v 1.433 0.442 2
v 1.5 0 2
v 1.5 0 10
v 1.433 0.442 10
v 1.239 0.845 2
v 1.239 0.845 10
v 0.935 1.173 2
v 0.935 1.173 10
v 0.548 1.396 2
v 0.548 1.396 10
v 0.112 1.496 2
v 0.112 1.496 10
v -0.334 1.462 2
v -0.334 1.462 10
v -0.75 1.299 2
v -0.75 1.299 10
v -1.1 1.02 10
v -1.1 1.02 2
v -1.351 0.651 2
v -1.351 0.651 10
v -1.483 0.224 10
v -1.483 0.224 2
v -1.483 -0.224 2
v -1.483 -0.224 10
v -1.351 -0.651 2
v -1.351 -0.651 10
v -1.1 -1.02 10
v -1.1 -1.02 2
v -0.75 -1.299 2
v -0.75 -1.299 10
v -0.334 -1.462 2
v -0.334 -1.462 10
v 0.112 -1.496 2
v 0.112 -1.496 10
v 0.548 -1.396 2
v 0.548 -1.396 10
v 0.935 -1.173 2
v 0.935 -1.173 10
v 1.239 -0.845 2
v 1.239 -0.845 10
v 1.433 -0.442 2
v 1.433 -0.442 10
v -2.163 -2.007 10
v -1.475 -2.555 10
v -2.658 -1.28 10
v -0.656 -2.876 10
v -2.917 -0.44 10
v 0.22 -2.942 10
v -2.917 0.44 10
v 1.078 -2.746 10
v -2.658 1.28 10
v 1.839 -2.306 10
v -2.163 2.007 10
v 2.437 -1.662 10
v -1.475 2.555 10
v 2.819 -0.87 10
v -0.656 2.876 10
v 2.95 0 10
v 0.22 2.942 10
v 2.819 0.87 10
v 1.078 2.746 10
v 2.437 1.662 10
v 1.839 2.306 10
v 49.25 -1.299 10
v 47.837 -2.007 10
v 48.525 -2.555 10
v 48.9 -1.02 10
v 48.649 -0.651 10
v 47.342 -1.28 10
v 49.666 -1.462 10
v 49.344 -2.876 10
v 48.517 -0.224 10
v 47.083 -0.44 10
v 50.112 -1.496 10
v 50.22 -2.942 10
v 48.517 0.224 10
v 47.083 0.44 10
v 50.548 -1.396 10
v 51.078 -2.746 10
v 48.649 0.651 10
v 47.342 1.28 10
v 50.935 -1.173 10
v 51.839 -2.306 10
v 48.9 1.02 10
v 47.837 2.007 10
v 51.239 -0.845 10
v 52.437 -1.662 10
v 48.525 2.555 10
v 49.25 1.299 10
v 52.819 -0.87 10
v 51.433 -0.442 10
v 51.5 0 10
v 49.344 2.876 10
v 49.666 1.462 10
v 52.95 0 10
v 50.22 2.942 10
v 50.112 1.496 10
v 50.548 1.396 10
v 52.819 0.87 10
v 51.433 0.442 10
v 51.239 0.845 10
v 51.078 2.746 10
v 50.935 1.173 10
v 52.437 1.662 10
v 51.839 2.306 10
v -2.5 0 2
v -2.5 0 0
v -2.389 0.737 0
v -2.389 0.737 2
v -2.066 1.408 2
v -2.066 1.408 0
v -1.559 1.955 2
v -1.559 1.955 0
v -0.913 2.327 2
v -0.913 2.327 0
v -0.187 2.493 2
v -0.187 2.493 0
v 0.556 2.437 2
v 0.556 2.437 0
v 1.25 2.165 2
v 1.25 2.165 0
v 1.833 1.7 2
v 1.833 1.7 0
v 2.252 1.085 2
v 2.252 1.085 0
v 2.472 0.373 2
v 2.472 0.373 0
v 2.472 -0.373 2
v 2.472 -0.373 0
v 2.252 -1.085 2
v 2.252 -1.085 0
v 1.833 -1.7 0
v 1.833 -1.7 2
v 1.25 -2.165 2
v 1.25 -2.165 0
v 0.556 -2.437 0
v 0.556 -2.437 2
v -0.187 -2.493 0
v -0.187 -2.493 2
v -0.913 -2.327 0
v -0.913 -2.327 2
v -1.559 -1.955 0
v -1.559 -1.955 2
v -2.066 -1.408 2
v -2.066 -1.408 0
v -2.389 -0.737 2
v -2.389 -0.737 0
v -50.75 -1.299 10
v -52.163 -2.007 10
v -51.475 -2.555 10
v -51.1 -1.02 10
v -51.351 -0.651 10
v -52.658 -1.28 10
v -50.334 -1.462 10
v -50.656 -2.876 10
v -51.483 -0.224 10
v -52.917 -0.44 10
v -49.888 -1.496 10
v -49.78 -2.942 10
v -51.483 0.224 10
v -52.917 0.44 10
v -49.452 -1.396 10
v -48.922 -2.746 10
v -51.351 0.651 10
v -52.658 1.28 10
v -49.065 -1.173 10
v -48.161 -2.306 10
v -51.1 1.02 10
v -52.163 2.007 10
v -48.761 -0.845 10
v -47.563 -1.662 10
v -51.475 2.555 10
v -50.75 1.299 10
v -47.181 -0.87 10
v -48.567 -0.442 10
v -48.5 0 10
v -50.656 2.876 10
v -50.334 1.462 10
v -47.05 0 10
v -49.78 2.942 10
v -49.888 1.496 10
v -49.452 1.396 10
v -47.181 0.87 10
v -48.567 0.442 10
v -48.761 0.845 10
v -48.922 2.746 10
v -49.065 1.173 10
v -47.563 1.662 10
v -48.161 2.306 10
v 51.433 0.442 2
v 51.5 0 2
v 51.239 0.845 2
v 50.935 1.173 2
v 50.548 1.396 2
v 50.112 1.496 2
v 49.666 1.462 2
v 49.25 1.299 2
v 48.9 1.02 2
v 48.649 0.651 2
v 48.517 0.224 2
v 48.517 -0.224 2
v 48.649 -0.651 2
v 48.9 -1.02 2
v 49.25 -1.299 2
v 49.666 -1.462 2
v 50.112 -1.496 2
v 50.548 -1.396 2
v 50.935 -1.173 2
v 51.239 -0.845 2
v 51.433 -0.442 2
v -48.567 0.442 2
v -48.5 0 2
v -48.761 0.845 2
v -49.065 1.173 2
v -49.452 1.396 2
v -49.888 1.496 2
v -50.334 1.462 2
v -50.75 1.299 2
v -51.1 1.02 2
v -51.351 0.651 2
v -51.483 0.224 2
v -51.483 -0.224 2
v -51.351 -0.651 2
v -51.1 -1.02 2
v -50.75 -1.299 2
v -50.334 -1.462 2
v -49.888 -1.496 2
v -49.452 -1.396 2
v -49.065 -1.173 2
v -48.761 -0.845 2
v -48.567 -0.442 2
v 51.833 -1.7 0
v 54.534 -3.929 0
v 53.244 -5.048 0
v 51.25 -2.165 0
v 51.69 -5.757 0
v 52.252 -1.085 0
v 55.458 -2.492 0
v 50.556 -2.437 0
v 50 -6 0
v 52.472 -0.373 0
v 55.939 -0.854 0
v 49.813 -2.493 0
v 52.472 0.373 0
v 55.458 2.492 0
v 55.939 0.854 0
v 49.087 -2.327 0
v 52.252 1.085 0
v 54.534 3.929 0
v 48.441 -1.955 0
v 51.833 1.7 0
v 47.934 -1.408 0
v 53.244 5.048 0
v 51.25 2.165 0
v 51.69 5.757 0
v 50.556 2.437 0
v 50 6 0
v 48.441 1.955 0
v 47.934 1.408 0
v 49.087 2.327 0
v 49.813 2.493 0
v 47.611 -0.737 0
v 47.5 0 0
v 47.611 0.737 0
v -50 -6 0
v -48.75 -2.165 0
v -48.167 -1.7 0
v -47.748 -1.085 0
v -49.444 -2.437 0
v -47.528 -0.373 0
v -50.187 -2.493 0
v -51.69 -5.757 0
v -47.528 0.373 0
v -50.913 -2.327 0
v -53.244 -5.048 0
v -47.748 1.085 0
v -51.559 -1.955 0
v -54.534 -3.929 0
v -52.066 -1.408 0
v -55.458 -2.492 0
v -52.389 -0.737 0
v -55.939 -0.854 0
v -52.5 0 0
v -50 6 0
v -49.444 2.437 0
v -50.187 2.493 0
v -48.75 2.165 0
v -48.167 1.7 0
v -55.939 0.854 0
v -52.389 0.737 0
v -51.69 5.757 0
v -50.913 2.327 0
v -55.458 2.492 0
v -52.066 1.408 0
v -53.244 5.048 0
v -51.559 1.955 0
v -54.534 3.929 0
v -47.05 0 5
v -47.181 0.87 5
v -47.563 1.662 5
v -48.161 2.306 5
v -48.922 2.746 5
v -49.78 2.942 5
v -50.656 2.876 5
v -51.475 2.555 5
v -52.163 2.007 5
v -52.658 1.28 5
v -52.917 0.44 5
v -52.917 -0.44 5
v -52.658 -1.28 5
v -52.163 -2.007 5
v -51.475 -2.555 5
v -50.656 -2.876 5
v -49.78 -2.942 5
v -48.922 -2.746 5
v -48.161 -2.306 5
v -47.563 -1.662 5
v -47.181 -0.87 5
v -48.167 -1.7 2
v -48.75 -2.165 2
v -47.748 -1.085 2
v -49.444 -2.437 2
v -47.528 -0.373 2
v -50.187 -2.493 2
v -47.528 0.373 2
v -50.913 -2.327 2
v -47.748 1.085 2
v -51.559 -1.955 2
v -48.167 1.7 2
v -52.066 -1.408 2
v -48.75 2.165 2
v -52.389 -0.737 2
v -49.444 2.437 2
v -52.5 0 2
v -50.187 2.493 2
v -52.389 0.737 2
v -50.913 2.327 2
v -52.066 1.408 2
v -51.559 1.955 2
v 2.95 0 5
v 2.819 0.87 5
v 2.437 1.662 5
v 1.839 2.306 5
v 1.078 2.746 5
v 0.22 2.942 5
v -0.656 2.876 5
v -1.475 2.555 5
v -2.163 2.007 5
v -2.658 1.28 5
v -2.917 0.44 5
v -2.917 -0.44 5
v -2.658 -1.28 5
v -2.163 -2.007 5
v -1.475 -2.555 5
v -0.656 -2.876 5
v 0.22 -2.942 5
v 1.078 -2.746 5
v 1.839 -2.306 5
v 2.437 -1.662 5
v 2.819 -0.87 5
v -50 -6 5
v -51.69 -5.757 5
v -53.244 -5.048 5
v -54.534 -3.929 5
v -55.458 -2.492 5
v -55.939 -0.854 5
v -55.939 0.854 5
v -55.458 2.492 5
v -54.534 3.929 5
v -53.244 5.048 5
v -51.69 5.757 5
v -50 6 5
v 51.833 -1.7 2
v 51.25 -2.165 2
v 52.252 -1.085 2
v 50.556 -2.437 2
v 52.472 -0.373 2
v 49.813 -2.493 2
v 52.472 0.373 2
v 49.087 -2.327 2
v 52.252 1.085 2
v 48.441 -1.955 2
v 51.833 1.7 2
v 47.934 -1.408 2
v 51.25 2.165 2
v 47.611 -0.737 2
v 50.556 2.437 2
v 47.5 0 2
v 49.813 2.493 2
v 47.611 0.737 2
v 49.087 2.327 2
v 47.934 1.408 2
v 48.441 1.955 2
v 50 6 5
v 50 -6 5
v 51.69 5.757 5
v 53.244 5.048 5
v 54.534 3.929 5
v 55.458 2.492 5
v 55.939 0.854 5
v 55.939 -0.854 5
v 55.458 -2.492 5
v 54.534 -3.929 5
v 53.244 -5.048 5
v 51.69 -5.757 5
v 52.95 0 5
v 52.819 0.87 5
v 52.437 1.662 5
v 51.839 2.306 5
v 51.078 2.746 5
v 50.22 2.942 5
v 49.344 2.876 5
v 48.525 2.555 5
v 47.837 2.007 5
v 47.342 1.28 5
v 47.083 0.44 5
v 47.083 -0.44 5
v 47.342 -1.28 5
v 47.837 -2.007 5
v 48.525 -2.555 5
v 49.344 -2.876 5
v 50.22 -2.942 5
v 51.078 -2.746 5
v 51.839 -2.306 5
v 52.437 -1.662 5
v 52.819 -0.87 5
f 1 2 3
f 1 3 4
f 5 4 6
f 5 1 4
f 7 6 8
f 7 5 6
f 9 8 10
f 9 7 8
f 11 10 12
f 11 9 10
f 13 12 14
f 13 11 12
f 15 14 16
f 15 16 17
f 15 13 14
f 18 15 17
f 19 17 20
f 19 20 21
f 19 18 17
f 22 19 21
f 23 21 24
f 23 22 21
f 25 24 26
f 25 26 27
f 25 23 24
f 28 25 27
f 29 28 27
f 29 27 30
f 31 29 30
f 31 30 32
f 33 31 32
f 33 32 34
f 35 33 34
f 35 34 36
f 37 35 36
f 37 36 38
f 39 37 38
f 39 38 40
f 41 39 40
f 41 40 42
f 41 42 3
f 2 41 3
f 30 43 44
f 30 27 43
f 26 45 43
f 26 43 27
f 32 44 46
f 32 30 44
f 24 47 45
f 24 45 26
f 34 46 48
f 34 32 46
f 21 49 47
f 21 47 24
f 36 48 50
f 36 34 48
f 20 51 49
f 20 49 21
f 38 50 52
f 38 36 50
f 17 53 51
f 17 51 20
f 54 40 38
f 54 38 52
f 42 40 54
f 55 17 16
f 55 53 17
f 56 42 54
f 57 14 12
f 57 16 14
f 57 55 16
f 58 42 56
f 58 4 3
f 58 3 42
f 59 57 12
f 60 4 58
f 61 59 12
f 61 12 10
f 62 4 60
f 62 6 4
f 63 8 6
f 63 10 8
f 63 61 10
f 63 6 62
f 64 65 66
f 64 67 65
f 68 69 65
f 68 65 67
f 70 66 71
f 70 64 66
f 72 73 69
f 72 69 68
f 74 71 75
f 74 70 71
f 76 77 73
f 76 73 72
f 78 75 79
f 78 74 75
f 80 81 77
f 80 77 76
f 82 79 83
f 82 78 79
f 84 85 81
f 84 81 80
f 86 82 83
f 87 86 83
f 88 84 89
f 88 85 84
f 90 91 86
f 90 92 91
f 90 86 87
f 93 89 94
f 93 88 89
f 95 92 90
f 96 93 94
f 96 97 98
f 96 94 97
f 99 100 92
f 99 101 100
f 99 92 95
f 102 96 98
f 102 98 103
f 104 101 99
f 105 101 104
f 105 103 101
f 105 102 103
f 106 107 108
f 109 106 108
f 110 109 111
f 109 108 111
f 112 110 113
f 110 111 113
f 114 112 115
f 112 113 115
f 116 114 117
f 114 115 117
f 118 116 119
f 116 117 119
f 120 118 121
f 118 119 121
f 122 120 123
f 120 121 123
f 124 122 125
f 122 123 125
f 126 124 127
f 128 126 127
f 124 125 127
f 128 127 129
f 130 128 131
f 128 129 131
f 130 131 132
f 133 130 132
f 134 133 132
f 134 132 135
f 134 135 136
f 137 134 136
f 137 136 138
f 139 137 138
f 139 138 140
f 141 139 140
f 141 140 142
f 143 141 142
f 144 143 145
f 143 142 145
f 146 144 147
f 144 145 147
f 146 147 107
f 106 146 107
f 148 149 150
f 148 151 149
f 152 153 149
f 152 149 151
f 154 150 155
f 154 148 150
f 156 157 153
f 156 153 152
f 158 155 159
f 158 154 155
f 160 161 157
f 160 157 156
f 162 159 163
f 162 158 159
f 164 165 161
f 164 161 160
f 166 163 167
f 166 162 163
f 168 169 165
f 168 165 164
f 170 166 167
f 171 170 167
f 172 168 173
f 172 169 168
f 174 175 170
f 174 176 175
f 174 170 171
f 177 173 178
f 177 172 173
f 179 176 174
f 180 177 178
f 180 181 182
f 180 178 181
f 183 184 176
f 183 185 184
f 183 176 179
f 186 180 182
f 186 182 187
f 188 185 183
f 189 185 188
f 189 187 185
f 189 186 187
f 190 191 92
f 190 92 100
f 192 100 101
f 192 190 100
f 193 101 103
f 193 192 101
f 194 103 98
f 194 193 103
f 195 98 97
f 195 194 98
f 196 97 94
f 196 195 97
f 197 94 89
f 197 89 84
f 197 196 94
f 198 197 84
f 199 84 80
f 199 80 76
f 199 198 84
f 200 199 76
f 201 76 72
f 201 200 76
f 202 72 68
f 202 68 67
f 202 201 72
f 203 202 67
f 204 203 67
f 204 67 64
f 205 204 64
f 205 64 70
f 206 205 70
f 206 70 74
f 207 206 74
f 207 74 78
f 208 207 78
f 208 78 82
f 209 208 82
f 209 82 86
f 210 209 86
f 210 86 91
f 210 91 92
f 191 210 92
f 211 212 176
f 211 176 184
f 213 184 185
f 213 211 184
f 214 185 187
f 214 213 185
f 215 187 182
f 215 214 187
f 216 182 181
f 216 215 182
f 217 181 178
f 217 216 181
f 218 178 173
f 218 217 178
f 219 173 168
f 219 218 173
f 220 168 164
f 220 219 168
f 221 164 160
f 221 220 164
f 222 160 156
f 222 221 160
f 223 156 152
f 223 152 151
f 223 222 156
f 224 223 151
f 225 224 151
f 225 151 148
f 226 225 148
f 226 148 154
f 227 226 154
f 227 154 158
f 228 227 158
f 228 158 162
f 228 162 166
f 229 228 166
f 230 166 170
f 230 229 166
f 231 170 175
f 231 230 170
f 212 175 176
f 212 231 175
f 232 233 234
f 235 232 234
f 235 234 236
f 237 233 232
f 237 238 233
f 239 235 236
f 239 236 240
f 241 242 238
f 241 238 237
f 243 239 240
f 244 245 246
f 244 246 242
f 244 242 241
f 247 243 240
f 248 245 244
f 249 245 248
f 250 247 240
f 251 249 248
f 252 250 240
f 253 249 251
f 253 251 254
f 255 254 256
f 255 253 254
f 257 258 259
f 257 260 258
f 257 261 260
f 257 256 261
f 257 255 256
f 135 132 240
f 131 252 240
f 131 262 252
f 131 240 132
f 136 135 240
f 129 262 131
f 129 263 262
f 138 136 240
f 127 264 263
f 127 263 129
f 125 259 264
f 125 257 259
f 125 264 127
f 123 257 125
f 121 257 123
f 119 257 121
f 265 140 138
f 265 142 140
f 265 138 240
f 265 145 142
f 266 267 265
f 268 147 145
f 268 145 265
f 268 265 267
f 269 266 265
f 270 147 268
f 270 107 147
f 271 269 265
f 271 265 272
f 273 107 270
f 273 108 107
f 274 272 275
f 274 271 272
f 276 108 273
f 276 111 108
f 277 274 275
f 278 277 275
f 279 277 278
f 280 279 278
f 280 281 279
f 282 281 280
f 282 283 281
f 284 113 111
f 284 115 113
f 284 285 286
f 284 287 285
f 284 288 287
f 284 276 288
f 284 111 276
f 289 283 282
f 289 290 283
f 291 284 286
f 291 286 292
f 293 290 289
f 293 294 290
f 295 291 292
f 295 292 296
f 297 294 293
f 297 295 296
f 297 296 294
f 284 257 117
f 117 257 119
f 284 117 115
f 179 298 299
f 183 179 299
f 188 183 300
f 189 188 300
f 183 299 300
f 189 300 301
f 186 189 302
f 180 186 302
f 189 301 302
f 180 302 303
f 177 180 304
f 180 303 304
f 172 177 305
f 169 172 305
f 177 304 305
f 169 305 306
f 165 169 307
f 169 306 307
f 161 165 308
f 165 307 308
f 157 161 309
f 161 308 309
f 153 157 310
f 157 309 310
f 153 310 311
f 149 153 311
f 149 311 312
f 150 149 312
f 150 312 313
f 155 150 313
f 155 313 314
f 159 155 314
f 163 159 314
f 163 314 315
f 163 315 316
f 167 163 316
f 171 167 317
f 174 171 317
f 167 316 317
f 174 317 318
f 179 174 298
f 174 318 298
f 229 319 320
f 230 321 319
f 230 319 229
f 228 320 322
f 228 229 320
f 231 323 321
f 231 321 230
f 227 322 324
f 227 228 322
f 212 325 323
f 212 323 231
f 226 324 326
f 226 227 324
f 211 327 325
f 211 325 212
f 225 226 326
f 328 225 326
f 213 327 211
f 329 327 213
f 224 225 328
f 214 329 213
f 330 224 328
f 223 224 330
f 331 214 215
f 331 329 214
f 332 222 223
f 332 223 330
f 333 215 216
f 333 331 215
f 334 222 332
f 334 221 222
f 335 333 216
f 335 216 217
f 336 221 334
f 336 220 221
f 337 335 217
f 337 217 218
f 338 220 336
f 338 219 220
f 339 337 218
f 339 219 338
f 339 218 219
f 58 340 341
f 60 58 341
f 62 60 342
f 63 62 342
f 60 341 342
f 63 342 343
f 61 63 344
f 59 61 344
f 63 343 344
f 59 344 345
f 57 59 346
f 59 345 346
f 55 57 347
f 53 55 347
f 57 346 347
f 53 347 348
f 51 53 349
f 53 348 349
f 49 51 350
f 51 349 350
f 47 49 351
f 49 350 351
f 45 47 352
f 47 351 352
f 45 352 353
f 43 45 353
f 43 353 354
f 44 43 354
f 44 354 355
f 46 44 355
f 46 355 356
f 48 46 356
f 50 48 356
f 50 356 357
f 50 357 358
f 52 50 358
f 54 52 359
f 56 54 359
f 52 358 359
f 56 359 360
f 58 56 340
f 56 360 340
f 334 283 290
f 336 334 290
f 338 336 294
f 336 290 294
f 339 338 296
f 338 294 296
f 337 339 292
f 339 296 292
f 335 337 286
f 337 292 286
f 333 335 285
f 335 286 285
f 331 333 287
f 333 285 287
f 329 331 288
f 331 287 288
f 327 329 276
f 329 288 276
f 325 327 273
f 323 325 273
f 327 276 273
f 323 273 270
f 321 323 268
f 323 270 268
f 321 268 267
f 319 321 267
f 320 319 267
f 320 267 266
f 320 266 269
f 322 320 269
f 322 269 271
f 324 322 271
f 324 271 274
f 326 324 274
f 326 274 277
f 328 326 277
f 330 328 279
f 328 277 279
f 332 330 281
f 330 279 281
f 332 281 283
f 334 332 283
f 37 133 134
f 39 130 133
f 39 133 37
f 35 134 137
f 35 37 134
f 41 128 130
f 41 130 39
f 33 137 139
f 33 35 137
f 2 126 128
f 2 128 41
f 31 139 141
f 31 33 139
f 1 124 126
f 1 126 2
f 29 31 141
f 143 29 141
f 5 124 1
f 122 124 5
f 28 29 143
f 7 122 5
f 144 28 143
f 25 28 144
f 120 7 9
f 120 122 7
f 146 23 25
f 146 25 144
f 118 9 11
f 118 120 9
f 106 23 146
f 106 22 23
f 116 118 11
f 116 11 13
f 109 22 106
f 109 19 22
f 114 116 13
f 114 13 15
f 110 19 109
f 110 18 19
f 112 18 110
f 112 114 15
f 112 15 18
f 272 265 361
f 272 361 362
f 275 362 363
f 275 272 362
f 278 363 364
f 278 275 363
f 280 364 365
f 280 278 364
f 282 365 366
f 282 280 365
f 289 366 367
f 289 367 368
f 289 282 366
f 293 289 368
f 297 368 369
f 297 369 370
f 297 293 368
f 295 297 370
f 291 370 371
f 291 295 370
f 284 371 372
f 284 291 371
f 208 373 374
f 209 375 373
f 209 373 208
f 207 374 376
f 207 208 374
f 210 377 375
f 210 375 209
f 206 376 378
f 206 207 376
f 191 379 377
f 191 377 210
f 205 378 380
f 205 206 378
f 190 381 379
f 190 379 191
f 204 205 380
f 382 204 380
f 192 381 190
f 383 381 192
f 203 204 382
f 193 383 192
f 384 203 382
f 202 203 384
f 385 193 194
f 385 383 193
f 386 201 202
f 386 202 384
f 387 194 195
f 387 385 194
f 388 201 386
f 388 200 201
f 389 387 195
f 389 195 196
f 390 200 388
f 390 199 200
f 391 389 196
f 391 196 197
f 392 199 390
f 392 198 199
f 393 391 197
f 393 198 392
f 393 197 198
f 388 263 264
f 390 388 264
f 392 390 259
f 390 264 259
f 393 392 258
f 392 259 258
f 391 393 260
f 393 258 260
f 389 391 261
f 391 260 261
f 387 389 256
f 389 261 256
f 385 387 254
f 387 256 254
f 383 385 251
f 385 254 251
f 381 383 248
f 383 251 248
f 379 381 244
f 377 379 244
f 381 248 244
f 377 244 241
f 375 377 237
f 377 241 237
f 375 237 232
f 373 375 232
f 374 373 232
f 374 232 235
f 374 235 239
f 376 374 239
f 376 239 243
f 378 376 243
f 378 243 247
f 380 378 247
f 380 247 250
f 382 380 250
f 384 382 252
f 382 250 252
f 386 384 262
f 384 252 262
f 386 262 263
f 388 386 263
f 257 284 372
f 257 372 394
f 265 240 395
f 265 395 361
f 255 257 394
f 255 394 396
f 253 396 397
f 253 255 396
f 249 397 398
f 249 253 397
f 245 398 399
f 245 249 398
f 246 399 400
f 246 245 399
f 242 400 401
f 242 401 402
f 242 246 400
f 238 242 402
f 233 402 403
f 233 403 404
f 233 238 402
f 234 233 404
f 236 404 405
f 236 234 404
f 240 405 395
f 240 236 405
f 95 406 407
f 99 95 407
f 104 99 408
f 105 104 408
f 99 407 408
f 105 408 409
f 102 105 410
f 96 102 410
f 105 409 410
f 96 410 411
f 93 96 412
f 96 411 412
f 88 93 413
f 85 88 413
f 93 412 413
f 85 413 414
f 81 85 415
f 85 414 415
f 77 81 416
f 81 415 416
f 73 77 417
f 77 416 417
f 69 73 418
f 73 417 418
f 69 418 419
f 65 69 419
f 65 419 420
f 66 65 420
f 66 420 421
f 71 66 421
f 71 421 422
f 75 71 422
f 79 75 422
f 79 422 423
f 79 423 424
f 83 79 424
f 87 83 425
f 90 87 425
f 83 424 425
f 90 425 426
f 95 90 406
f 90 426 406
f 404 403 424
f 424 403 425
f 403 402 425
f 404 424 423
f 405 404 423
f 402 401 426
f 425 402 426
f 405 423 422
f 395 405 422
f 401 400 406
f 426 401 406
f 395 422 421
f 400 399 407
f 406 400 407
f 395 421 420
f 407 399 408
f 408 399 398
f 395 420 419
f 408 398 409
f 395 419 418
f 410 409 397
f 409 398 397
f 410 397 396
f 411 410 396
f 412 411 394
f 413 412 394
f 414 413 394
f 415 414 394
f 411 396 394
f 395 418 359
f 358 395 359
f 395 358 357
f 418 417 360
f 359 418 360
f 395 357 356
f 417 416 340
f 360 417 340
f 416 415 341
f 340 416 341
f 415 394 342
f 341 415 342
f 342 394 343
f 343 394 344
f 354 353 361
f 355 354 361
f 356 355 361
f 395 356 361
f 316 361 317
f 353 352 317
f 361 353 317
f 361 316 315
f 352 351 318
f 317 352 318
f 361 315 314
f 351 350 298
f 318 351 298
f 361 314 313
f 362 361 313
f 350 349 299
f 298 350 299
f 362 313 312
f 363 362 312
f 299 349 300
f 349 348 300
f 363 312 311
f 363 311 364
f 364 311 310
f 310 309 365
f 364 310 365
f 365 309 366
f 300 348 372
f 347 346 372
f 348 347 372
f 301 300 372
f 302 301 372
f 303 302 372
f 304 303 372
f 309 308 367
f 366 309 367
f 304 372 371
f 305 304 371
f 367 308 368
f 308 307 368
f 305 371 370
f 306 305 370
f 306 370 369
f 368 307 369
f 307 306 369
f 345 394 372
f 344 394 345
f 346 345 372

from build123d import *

# Parameters (mm, degrees)
SKETCH1_R           = 1.5
BOSS_EXTRUDE1_DEPTH = 5
SKETCH2_R           = 2.95
SKETCH2_R_2         = 1.5
BOSS_EXTRUDE2_DEPTH = 5
SKETCH4_R           = 2.5
CUT_EXTRUDE1_DEPTH  = 2


with BuildPart() as part:
    # Sketch1 → Boss-Extrude1 (new body)
    with BuildSketch(Plane.XY):
        with BuildLine():
            Line((-50, 6), (50, 6))
            ThreePointArc((50, 6), (56, 0), (50, -6))
            Line((50, -6), (-50, -6))
            ThreePointArc((-50, -6), (-56, 0), (-50, 6))
        make_face()
        with Locations((-50, 0)):
            Circle(SKETCH1_R, mode=Mode.SUBTRACT)
        with Locations((50, 0)):
            Circle(SKETCH1_R, mode=Mode.SUBTRACT)
        Circle(SKETCH1_R, mode=Mode.SUBTRACT)
    extrude(amount=BOSS_EXTRUDE1_DEPTH)

    # Sketch2 → Boss-Extrude2 (add)
    # profile 1 of 3: a face of its own
    with BuildSketch(Plane.XY.offset(5)):
        with Locations((-50, 0)):
            Circle(SKETCH2_R)
        with Locations((-50, 0)):
            Circle(SKETCH2_R_2, mode=Mode.SUBTRACT)
    # profile 2 of 3: a face of its own
    with BuildSketch(Plane.XY.offset(5)):
        Circle(SKETCH2_R)
        Circle(SKETCH2_R_2, mode=Mode.SUBTRACT)
    # profile 3 of 3: a face of its own
    with BuildSketch(Plane.XY.offset(5)):
        with Locations((50, 0)):
            Circle(SKETCH2_R)
        with Locations((50, 0)):
            Circle(SKETCH2_R_2, mode=Mode.SUBTRACT)
    extrude(amount=BOSS_EXTRUDE2_DEPTH)

    # Sketch4 → Cut-Extrude1 (cut)
    with BuildSketch(Plane(origin=(0, 0, 0), x_dir=(-1, 0, 0), z_dir=(0, 0, -1))):
        with Locations((-50, 0)):
            Circle(SKETCH4_R)
        Circle(SKETCH4_R)
        with Locations((50, 0)):
            Circle(SKETCH4_R)
    extrude(amount=-CUT_EXTRUDE1_DEPTH, mode=Mode.SUBTRACT)


solid = part.part
